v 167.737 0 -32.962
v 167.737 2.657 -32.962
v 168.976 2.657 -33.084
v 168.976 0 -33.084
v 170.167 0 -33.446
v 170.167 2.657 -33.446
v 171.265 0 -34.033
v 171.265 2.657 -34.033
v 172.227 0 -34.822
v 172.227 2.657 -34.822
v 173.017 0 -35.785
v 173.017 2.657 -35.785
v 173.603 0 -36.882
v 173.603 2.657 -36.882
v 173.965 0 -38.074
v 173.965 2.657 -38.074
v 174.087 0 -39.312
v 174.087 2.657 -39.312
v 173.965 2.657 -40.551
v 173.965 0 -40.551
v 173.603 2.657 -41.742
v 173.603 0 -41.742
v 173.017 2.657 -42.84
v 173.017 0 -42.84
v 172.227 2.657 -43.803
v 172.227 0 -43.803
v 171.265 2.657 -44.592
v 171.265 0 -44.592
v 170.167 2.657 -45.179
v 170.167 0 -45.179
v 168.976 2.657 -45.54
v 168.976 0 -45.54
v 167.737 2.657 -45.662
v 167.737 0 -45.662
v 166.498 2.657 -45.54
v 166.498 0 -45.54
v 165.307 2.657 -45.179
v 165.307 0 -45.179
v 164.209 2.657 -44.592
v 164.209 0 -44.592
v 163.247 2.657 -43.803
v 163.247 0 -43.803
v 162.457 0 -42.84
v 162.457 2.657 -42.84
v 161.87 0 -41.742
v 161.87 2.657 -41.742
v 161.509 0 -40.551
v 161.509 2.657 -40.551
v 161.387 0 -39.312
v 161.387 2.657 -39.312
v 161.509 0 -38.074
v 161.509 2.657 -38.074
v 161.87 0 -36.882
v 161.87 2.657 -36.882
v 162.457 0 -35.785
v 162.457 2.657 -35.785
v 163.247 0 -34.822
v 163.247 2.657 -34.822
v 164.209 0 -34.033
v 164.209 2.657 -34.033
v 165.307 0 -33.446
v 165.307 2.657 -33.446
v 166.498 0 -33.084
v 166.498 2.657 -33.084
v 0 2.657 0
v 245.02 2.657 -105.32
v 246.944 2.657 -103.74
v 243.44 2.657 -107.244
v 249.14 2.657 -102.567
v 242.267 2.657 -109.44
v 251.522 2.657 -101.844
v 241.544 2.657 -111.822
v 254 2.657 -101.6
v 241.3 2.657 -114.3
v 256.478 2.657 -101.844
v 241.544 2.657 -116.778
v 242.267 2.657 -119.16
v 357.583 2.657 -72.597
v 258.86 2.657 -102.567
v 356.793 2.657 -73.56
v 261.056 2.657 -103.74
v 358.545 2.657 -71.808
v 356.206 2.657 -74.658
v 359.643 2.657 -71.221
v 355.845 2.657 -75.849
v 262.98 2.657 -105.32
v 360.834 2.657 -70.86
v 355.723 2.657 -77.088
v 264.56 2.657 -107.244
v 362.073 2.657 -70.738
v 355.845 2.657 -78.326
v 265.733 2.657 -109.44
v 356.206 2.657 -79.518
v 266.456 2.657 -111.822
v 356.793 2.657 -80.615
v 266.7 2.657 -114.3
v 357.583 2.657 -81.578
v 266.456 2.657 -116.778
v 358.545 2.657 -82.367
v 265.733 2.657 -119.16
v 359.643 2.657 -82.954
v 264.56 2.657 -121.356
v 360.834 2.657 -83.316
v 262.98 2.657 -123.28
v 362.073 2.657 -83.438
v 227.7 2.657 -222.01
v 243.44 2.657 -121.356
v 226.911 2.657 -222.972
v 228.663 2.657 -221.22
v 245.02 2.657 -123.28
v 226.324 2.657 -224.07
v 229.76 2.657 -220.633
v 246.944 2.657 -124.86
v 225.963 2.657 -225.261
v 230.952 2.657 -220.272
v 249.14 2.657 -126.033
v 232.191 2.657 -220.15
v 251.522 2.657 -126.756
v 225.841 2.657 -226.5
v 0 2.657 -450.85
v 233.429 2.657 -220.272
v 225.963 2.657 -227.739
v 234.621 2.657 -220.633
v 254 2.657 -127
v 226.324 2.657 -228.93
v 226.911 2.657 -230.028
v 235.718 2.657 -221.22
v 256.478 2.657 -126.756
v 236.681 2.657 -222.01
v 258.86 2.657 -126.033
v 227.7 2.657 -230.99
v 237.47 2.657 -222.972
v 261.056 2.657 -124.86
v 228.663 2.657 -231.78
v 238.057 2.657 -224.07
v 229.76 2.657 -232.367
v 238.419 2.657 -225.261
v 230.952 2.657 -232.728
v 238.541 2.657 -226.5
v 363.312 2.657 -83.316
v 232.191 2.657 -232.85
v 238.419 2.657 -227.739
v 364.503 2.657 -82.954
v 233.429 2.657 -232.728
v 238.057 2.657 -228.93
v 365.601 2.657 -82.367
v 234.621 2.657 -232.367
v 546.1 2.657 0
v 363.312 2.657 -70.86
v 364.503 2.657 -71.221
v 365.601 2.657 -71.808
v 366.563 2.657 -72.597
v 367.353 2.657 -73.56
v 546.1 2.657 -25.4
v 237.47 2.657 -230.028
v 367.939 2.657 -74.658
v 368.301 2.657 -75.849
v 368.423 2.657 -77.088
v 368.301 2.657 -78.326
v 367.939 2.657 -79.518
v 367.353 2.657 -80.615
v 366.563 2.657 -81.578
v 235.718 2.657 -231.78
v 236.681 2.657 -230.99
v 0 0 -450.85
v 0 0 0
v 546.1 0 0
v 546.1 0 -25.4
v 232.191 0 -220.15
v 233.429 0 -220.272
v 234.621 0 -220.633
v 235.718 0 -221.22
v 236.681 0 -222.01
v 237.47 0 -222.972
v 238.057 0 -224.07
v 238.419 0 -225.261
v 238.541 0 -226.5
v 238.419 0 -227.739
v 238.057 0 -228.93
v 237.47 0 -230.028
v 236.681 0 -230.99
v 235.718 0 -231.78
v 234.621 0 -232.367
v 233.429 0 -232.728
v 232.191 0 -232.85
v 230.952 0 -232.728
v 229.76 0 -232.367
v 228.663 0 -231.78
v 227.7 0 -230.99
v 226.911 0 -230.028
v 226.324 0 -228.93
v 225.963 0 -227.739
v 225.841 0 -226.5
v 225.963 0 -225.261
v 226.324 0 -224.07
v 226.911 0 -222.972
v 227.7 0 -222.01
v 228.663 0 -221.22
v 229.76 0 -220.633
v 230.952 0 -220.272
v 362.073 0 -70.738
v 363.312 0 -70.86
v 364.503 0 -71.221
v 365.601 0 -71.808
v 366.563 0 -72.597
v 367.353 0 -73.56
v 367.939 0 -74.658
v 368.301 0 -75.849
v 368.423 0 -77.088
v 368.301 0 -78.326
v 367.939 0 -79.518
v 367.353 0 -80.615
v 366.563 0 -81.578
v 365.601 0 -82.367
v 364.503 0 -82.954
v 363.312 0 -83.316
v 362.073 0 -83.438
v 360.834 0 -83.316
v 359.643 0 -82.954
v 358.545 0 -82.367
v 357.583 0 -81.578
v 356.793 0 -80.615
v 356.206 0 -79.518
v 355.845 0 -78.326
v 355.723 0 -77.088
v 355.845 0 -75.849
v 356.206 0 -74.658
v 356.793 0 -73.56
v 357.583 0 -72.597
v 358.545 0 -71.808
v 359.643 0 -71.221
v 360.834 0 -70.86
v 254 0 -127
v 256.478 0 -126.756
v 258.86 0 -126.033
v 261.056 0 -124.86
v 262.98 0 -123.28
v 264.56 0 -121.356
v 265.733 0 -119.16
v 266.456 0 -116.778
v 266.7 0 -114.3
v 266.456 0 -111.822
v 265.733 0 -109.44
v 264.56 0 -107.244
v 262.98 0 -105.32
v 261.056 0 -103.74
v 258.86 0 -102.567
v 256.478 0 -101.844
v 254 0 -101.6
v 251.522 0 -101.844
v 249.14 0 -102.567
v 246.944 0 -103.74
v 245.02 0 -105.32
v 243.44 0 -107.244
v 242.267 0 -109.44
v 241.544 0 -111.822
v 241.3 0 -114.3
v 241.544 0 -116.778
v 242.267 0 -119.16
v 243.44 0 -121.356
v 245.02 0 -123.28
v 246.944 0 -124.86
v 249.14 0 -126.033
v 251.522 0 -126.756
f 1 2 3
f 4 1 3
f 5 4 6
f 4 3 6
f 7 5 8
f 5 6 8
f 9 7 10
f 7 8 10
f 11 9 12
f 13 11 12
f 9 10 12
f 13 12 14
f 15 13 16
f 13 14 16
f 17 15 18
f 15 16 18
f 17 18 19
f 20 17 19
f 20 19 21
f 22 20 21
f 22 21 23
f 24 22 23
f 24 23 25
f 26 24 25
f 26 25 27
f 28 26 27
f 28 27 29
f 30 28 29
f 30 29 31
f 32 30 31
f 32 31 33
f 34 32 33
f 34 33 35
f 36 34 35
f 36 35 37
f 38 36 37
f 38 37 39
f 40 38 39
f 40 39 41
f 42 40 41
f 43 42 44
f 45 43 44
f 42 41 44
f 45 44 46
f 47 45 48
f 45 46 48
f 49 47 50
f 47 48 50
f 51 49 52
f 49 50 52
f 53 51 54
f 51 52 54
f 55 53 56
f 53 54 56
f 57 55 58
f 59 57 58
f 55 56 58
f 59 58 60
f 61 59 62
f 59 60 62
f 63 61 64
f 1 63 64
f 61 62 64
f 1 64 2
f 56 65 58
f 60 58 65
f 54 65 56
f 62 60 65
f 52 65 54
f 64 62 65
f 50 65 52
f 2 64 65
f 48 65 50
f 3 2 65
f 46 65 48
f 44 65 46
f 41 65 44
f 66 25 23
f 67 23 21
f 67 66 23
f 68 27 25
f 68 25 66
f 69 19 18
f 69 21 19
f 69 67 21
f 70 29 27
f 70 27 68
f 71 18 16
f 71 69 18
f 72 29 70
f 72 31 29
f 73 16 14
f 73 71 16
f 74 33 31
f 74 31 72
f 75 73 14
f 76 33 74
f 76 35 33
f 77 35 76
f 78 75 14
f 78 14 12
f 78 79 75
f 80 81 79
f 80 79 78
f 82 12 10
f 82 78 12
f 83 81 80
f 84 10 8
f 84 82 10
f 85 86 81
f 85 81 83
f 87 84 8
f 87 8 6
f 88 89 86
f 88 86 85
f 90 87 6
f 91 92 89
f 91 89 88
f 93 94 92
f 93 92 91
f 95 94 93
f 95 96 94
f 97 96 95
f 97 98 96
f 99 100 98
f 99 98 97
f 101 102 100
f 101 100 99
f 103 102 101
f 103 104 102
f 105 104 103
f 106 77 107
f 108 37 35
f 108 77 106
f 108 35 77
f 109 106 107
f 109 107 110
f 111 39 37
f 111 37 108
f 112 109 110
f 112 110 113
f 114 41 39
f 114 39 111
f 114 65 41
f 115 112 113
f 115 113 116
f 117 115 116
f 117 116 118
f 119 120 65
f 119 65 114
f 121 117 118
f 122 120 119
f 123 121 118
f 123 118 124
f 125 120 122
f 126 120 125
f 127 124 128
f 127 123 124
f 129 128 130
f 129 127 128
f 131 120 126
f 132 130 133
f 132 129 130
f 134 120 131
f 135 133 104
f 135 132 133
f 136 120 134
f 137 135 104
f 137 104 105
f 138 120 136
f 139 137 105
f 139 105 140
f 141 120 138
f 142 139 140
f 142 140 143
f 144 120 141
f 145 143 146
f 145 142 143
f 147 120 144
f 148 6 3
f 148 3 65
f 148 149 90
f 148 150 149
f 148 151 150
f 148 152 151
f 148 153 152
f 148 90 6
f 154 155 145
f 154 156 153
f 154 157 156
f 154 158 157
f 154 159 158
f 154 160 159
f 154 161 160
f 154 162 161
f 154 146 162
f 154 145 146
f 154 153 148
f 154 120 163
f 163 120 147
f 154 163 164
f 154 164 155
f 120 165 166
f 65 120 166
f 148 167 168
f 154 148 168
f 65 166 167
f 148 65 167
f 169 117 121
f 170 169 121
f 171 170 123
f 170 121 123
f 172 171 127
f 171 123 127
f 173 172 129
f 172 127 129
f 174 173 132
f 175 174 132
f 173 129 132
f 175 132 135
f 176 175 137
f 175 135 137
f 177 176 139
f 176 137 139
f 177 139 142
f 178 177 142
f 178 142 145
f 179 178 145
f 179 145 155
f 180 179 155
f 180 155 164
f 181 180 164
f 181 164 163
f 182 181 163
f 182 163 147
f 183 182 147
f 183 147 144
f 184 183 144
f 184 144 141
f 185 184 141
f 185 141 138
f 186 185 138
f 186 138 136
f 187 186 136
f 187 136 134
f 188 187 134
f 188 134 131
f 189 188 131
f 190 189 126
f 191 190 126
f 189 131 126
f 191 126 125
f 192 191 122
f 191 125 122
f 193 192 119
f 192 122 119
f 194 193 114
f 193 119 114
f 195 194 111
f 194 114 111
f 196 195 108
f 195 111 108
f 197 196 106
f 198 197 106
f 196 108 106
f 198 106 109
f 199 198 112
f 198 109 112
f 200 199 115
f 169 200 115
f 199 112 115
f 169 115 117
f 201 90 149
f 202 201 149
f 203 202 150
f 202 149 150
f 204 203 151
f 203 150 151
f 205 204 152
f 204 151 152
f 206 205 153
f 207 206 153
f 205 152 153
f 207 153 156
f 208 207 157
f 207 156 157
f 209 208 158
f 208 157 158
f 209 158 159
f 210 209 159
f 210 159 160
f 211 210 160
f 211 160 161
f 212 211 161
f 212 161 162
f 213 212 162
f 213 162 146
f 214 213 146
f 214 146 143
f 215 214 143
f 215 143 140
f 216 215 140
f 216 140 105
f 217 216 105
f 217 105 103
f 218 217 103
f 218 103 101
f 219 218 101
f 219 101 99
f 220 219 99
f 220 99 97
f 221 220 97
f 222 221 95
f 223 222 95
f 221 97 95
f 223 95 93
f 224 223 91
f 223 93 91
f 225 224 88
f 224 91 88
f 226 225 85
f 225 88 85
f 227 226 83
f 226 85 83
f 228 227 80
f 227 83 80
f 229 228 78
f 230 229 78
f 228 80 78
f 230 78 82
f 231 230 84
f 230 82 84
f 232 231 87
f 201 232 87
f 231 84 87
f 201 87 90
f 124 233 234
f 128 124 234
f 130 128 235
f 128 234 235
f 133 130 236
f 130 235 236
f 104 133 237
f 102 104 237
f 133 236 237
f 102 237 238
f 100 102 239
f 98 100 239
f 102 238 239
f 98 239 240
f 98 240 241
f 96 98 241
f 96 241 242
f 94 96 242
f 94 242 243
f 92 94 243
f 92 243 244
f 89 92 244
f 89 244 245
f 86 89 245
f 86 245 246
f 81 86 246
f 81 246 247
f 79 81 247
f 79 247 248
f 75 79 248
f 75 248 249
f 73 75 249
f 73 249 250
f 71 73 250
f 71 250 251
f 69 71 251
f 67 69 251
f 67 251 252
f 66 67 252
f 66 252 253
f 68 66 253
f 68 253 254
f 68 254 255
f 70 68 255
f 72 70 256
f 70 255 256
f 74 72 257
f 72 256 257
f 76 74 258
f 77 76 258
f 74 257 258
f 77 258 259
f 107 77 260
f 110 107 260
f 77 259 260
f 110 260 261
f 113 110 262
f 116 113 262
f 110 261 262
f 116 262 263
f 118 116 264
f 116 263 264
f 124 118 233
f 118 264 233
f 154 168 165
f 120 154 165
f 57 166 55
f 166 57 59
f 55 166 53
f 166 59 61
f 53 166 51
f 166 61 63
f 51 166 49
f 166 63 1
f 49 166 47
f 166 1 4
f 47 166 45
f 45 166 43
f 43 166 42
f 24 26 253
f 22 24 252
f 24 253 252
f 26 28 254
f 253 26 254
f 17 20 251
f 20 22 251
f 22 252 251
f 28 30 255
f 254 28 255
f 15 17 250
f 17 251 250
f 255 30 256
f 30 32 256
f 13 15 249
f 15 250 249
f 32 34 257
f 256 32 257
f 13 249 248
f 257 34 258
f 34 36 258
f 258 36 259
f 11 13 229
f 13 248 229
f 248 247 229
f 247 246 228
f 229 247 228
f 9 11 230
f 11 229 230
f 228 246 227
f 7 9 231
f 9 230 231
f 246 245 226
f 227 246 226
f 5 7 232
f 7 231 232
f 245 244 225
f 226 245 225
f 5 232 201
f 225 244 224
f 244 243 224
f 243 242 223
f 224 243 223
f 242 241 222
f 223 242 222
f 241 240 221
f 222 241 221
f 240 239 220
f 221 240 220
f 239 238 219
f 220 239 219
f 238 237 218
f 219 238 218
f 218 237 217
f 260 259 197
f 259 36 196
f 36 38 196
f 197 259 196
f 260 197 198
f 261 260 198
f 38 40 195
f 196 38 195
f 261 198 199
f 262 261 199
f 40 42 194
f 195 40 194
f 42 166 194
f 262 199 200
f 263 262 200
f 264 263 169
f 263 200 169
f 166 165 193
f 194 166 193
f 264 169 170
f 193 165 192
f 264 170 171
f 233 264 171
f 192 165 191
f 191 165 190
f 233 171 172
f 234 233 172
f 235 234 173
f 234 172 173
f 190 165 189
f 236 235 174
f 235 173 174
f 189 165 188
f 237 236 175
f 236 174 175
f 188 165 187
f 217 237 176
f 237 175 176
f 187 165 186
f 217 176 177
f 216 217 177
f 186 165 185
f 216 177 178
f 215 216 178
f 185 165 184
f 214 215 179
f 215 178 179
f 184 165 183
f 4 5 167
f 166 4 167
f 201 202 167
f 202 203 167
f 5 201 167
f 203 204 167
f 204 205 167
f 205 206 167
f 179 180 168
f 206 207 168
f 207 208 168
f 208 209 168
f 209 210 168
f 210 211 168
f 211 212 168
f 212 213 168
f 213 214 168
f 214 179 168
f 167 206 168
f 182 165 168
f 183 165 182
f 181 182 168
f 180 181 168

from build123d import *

# Parameters (mm, degrees)
BOSS_EXTRUDE1_DEPTH = 2.65684
SKETCH2_R           = 12.7
CUT_EXTRUDE1_DEPTH  = 709.165228812
SKETCH3_R           = 6.35
CUT_EXTRUDE2_DEPTH  = 709.165228812


with BuildPart() as part:
    # Sketch1 → Boss-Extrude1 (new body)
    with BuildSketch(Plane(origin=(0, 0, 0), x_dir=(1, 0, 0), z_dir=(0, 1, 0))):
        Polygon((0, 450.85), (0, 0), (546.1, 0), (546.1, 25.4), align=None)
    extrude(amount=BOSS_EXTRUDE1_DEPTH)

    # Sketch2 → Cut-Extrude1 (cut, through all)
    with BuildSketch(Plane.XZ):
        with Locations(Location((254, -114.3, 0), (0, 0, 270))):
            Circle(SKETCH2_R)
    extrude(amount=-CUT_EXTRUDE1_DEPTH, mode=Mode.SUBTRACT)

    # Sketch3 → Cut-Extrude2 (cut, through all)
    with BuildSketch(Plane(origin=(0, 2.65684, 0), x_dir=(1, 0, 0), z_dir=(0, 1, 0))):
        with Locations(Location((362.072773191, 77.087559946, 0), (0, 0, 270))):
            Circle(SKETCH3_R)
        with Locations(Location((167.736694981, 39.312452986, 0), (0, 0, 270))):
            Circle(SKETCH3_R)
        with Locations(Location((232.190531828, 226.499987068, 0), (0, 0, 270))):
            Circle(SKETCH3_R)
    extrude(amount=-CUT_EXTRUDE2_DEPTH, mode=Mode.SUBTRACT)


solid = part.part
